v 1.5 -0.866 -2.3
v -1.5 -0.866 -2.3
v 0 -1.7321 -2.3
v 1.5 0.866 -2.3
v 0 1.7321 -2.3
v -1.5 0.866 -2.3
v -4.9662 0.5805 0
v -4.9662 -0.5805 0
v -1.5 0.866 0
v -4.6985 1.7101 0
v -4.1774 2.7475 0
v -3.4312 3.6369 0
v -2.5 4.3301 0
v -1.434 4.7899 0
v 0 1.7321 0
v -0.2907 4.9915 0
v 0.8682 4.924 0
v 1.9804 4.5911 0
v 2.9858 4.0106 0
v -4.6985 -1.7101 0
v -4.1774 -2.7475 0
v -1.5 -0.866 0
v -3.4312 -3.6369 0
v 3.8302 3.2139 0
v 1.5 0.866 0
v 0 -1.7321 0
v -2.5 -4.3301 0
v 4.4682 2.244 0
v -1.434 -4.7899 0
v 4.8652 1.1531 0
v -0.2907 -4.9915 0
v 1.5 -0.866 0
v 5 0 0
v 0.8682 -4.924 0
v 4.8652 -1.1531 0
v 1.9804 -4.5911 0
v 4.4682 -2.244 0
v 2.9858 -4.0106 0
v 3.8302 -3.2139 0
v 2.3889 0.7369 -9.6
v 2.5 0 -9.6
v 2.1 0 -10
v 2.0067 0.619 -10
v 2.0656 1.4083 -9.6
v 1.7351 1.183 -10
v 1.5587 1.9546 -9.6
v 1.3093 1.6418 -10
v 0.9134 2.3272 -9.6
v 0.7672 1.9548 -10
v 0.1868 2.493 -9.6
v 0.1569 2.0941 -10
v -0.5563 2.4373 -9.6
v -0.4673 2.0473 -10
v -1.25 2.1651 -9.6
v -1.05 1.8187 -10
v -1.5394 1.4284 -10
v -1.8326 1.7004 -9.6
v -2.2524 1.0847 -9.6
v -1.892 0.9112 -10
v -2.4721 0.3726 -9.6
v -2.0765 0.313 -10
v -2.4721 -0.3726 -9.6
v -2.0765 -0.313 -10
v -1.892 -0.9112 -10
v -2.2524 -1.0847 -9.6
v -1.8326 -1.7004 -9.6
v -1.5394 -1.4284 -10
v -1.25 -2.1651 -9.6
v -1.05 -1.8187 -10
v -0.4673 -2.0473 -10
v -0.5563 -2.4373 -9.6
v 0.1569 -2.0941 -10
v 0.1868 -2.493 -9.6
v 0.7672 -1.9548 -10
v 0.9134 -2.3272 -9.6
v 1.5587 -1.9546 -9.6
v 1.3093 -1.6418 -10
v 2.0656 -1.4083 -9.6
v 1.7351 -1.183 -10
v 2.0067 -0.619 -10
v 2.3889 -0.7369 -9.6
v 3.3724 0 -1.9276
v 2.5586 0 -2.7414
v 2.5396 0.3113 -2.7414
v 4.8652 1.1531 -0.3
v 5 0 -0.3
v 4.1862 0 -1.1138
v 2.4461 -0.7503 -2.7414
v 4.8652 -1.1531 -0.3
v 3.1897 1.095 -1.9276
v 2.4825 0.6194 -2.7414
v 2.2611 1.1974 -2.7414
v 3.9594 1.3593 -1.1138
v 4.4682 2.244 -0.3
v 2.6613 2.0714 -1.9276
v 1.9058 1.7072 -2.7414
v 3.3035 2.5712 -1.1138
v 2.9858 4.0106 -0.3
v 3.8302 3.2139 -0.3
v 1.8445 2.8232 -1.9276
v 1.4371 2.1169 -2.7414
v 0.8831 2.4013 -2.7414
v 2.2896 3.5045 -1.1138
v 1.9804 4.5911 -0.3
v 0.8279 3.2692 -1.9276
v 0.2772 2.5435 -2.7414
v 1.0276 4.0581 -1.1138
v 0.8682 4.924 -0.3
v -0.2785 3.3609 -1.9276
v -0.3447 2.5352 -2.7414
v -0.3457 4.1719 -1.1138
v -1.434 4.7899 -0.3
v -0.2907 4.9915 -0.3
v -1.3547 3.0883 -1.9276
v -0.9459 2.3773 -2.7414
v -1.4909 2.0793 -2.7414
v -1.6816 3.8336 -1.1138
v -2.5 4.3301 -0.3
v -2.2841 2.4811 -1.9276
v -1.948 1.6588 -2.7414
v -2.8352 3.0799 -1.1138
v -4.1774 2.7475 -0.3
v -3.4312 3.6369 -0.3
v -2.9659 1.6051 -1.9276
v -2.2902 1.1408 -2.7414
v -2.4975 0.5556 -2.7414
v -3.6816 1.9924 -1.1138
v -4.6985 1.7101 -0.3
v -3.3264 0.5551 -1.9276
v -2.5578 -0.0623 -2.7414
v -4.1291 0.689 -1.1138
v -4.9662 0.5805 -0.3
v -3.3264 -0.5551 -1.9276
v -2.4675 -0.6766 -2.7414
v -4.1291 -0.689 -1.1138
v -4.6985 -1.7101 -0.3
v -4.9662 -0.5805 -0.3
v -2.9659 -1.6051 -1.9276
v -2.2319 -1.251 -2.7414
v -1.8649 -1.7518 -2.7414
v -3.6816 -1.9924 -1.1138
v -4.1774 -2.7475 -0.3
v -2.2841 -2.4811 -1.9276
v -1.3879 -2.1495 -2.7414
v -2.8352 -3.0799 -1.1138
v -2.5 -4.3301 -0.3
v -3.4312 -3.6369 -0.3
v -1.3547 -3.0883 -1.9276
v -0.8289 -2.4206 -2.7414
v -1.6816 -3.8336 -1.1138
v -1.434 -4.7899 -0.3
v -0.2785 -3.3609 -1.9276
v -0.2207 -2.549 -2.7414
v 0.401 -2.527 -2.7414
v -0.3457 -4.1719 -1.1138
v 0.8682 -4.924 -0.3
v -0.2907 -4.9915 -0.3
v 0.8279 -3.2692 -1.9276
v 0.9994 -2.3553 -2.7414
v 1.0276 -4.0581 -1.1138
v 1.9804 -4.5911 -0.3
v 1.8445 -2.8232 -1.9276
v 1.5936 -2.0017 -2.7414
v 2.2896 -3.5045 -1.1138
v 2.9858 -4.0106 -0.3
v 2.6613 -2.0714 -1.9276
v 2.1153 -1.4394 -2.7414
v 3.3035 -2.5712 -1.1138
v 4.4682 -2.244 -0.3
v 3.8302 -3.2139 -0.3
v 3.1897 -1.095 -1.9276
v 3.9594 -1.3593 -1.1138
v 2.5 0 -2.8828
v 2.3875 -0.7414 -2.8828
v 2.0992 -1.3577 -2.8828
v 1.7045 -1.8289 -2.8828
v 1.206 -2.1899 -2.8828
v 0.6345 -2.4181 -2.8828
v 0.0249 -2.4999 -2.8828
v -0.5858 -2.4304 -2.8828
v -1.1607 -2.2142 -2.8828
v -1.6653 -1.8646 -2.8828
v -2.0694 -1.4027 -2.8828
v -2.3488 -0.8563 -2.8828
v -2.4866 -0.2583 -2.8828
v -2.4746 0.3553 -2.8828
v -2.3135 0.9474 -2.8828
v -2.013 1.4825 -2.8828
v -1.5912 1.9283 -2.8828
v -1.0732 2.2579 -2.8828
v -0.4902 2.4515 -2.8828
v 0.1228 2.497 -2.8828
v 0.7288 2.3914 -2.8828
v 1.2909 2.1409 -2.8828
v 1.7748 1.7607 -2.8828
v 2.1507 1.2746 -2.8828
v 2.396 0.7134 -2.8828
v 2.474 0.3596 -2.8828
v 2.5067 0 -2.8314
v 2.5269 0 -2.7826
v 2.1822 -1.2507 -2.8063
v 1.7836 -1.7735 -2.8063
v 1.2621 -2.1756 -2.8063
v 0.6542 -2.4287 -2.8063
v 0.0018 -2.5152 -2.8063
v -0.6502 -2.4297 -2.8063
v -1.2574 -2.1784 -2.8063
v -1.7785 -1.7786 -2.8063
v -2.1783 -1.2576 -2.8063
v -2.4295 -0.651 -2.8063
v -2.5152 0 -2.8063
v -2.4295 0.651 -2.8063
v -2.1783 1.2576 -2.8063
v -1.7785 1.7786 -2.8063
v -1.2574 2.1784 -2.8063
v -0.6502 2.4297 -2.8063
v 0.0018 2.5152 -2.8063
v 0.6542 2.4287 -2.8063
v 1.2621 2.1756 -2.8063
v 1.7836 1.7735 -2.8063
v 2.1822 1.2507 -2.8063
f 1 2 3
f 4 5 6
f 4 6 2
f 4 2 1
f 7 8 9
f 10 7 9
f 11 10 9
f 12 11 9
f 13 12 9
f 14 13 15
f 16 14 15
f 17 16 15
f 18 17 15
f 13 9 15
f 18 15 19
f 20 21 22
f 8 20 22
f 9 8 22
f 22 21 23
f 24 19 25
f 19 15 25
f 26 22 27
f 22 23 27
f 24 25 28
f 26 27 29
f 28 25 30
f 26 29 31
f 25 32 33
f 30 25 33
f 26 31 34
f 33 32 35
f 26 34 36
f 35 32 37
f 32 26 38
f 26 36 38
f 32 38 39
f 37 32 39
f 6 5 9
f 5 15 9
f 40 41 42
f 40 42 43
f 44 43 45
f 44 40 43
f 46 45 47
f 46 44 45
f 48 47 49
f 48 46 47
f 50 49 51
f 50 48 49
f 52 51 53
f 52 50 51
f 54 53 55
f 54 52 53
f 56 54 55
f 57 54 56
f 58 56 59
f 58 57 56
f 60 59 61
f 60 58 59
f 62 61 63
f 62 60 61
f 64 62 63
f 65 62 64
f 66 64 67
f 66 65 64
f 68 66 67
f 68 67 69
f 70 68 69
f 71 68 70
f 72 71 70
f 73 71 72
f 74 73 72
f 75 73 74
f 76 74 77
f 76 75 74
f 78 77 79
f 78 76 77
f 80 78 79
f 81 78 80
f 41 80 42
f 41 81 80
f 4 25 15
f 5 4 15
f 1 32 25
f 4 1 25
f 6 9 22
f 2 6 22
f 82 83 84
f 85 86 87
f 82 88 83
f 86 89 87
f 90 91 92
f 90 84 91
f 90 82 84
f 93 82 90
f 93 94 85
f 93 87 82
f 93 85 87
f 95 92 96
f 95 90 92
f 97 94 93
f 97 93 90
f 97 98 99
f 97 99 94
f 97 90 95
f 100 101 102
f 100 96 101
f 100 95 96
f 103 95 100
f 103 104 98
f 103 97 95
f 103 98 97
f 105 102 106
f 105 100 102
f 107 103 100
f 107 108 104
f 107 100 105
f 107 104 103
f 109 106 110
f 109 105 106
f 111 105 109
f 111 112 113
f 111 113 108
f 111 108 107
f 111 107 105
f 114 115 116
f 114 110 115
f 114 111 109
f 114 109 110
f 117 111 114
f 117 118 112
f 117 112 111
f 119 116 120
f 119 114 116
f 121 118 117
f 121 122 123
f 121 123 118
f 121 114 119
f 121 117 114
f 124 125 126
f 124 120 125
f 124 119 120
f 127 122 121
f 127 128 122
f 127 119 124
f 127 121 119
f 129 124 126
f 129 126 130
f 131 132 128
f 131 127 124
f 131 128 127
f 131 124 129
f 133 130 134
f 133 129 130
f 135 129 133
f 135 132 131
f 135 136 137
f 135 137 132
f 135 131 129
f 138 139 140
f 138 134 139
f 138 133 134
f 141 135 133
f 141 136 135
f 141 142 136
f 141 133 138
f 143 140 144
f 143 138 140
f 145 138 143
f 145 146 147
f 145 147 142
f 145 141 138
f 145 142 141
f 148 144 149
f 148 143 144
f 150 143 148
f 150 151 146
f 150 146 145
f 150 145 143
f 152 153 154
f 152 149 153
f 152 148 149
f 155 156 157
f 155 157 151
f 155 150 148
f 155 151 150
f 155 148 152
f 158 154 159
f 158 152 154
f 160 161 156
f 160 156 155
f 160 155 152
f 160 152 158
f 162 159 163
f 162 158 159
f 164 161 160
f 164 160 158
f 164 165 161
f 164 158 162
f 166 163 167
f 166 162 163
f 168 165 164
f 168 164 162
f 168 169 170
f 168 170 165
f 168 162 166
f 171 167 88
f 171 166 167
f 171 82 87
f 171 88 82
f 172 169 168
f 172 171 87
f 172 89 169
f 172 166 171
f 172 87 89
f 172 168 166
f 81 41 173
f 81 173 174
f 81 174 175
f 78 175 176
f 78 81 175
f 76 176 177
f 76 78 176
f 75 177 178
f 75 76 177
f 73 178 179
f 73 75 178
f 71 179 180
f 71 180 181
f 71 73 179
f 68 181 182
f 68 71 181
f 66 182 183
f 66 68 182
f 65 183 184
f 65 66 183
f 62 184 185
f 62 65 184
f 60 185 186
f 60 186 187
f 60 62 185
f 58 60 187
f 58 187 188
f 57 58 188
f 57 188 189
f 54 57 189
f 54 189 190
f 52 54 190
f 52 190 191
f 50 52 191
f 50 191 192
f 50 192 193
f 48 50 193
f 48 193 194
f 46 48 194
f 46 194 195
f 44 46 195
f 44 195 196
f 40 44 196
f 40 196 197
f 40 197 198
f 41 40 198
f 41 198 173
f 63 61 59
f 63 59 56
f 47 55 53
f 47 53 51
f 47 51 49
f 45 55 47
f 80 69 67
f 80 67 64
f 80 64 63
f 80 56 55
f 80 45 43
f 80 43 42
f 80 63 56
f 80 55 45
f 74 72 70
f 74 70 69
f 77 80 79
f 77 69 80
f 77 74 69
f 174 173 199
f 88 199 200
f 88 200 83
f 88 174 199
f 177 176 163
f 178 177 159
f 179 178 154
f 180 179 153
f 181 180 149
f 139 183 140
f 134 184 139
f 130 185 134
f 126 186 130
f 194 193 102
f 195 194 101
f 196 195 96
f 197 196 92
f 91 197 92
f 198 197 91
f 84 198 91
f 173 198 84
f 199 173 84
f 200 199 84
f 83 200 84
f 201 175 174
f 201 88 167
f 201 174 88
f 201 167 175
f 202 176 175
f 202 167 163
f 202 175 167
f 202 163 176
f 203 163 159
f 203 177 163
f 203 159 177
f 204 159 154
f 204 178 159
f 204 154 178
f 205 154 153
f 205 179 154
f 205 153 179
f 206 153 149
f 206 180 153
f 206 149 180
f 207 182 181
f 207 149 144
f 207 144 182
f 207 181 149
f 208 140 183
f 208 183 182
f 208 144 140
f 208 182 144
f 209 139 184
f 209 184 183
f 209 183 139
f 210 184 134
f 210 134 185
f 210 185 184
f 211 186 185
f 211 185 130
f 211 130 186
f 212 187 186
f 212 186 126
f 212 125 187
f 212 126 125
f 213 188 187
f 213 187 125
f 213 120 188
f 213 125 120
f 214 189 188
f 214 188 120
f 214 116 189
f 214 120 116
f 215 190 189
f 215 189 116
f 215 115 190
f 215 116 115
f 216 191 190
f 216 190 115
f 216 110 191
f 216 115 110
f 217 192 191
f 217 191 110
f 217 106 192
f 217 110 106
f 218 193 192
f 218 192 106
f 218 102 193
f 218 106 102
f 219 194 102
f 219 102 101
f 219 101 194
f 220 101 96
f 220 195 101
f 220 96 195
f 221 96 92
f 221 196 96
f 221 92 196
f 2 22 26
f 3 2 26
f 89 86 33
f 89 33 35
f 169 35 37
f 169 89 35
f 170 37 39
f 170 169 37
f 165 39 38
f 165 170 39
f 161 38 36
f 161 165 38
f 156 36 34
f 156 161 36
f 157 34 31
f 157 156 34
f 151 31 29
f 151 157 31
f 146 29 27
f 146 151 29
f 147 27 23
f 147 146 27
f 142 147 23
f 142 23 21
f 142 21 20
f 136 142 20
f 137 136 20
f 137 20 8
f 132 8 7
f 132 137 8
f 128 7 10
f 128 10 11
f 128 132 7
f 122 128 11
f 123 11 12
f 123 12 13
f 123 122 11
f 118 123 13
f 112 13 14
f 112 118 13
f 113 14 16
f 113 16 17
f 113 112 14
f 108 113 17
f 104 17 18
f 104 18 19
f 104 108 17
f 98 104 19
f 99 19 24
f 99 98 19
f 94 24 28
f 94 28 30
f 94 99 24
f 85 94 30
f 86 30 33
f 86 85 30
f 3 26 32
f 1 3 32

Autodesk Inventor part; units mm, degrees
ref_plane "YZ Plane" through (0, 0, 0) normal (1, 0, 0) x (0, 1, 0)
sketch "Эскиз1" plane through (0, 0, 0) normal (0, 1, 0) x (-1, 0, 0)
  point P0 (0, 0)
sketch "Эскиз2" plane through (0, 0, 0) normal (0, 1, 0) x (-1, 0, 0)
  line L0 (-2.5, -10) -> (0, -10)
  line L1 (-2.5, -2.8) -> (-2.5, -10)
  line L2 (-5, -0.3) -> (-2.5, -2.8)
  line L3 (-5, 0) -> (-5, -0.3)
  line L4 (0, 0) -> (-5, 0)
  line L5 (0, -10) -> (0, 0)
  line L6 (0, -10) -> (0, 0)
  line L7 (0, -12) -> (0, 2) projected
  line L8 (1, 0) -> (-6, 0) projected
  dimension "d3" = 5
  dimension "d5" = 2.5
  dimension "d7" = 10
  dimension "ParC" = 0.3
  dimension "d22" = 0
  dimension "d23" = 0
  dimension "d43" = 45
revolve "Вращение1" add sketch "Эскиз2" angle 360 about axis through (0, 0, -10) along (0, 0, -1)
sketch "Эскиз3" plane through (0, 0, 0) normal (0, 0, 1) x (1, 0, 0)
  line L0 (-1.5, 0.866) -> (-1.5, -0.866)
  line L1 (0, 1.7321) -> (-1.5, 0.866)
  line L2 (1.5, 0.866) -> (0, 1.7321)
  line L3 (1.5, -0.866) -> (1.5, 0.866)
  line L4 (0, -1.7321) -> (1.5, -0.866)
  line L5 (-1.5, -0.866) -> (0, -1.7321)
  circle A0 centre (0, 0) radius 1.5 construction
  circle A1 centre (0, 0) radius 2.5 construction
  dimension "d11" = 3
  dimension "d13" = 120
  dimension "d15" = 120
extrude "Выдавливание1" cut sketch "Эскиз3" against normal blind 2.3
fillet "Сопряжение1" radius 0.2 1 edges at (-2.5, 0, -2.8)
chamfer "Фаска1" distance 0.4 angle 45 1 edges at (-2.5, 0, -10) measured on face at (-0.599, -2.4272, -7.6276)
thread "Резьба1" size "M5x0.8" class "6g" standard "ISO Metric profile" length 5.6
ref_plane "MSC_PF1" through (0, 0, 0) normal (1, 0, 0) x (0, 1, 0)
ref_plane "MSC_PT1" through (0, 0, 0) normal (0, 0, -1) x (-1, 0, 0)
equation "\"d3\" = 0.5 * dk"
equation "\"d5\" = 0.5 * NND"
equation "\"d7\" = NLG"
equation "\"d43\" = 0.5 * ang"
equation "\"d11\" = ParS"
equation "\"d16\" = ParT"
equation "\"d18\" = r"
equation "\"d19\" = 0.5 * PTC"
equation "\"d39\" = 0.5 * PTC"
equation "\"NND\" = 5"
equation "\"PTC\" = 0.8"
equation "\"ParK\" = 2.8"
equation "\"ParS\" = 3"
equation "\"ParT\" = 2.3"
equation "\"r\" = 0.2"
equation "\"NLG\" = 10"
equation "\"ang\" = 90deg"
equation "\"THREADDIA\" = NND"
equation "\"dk\" = 10"
properties part number "DIN 7991 - M5x10" material "Сталь, мягкая"
